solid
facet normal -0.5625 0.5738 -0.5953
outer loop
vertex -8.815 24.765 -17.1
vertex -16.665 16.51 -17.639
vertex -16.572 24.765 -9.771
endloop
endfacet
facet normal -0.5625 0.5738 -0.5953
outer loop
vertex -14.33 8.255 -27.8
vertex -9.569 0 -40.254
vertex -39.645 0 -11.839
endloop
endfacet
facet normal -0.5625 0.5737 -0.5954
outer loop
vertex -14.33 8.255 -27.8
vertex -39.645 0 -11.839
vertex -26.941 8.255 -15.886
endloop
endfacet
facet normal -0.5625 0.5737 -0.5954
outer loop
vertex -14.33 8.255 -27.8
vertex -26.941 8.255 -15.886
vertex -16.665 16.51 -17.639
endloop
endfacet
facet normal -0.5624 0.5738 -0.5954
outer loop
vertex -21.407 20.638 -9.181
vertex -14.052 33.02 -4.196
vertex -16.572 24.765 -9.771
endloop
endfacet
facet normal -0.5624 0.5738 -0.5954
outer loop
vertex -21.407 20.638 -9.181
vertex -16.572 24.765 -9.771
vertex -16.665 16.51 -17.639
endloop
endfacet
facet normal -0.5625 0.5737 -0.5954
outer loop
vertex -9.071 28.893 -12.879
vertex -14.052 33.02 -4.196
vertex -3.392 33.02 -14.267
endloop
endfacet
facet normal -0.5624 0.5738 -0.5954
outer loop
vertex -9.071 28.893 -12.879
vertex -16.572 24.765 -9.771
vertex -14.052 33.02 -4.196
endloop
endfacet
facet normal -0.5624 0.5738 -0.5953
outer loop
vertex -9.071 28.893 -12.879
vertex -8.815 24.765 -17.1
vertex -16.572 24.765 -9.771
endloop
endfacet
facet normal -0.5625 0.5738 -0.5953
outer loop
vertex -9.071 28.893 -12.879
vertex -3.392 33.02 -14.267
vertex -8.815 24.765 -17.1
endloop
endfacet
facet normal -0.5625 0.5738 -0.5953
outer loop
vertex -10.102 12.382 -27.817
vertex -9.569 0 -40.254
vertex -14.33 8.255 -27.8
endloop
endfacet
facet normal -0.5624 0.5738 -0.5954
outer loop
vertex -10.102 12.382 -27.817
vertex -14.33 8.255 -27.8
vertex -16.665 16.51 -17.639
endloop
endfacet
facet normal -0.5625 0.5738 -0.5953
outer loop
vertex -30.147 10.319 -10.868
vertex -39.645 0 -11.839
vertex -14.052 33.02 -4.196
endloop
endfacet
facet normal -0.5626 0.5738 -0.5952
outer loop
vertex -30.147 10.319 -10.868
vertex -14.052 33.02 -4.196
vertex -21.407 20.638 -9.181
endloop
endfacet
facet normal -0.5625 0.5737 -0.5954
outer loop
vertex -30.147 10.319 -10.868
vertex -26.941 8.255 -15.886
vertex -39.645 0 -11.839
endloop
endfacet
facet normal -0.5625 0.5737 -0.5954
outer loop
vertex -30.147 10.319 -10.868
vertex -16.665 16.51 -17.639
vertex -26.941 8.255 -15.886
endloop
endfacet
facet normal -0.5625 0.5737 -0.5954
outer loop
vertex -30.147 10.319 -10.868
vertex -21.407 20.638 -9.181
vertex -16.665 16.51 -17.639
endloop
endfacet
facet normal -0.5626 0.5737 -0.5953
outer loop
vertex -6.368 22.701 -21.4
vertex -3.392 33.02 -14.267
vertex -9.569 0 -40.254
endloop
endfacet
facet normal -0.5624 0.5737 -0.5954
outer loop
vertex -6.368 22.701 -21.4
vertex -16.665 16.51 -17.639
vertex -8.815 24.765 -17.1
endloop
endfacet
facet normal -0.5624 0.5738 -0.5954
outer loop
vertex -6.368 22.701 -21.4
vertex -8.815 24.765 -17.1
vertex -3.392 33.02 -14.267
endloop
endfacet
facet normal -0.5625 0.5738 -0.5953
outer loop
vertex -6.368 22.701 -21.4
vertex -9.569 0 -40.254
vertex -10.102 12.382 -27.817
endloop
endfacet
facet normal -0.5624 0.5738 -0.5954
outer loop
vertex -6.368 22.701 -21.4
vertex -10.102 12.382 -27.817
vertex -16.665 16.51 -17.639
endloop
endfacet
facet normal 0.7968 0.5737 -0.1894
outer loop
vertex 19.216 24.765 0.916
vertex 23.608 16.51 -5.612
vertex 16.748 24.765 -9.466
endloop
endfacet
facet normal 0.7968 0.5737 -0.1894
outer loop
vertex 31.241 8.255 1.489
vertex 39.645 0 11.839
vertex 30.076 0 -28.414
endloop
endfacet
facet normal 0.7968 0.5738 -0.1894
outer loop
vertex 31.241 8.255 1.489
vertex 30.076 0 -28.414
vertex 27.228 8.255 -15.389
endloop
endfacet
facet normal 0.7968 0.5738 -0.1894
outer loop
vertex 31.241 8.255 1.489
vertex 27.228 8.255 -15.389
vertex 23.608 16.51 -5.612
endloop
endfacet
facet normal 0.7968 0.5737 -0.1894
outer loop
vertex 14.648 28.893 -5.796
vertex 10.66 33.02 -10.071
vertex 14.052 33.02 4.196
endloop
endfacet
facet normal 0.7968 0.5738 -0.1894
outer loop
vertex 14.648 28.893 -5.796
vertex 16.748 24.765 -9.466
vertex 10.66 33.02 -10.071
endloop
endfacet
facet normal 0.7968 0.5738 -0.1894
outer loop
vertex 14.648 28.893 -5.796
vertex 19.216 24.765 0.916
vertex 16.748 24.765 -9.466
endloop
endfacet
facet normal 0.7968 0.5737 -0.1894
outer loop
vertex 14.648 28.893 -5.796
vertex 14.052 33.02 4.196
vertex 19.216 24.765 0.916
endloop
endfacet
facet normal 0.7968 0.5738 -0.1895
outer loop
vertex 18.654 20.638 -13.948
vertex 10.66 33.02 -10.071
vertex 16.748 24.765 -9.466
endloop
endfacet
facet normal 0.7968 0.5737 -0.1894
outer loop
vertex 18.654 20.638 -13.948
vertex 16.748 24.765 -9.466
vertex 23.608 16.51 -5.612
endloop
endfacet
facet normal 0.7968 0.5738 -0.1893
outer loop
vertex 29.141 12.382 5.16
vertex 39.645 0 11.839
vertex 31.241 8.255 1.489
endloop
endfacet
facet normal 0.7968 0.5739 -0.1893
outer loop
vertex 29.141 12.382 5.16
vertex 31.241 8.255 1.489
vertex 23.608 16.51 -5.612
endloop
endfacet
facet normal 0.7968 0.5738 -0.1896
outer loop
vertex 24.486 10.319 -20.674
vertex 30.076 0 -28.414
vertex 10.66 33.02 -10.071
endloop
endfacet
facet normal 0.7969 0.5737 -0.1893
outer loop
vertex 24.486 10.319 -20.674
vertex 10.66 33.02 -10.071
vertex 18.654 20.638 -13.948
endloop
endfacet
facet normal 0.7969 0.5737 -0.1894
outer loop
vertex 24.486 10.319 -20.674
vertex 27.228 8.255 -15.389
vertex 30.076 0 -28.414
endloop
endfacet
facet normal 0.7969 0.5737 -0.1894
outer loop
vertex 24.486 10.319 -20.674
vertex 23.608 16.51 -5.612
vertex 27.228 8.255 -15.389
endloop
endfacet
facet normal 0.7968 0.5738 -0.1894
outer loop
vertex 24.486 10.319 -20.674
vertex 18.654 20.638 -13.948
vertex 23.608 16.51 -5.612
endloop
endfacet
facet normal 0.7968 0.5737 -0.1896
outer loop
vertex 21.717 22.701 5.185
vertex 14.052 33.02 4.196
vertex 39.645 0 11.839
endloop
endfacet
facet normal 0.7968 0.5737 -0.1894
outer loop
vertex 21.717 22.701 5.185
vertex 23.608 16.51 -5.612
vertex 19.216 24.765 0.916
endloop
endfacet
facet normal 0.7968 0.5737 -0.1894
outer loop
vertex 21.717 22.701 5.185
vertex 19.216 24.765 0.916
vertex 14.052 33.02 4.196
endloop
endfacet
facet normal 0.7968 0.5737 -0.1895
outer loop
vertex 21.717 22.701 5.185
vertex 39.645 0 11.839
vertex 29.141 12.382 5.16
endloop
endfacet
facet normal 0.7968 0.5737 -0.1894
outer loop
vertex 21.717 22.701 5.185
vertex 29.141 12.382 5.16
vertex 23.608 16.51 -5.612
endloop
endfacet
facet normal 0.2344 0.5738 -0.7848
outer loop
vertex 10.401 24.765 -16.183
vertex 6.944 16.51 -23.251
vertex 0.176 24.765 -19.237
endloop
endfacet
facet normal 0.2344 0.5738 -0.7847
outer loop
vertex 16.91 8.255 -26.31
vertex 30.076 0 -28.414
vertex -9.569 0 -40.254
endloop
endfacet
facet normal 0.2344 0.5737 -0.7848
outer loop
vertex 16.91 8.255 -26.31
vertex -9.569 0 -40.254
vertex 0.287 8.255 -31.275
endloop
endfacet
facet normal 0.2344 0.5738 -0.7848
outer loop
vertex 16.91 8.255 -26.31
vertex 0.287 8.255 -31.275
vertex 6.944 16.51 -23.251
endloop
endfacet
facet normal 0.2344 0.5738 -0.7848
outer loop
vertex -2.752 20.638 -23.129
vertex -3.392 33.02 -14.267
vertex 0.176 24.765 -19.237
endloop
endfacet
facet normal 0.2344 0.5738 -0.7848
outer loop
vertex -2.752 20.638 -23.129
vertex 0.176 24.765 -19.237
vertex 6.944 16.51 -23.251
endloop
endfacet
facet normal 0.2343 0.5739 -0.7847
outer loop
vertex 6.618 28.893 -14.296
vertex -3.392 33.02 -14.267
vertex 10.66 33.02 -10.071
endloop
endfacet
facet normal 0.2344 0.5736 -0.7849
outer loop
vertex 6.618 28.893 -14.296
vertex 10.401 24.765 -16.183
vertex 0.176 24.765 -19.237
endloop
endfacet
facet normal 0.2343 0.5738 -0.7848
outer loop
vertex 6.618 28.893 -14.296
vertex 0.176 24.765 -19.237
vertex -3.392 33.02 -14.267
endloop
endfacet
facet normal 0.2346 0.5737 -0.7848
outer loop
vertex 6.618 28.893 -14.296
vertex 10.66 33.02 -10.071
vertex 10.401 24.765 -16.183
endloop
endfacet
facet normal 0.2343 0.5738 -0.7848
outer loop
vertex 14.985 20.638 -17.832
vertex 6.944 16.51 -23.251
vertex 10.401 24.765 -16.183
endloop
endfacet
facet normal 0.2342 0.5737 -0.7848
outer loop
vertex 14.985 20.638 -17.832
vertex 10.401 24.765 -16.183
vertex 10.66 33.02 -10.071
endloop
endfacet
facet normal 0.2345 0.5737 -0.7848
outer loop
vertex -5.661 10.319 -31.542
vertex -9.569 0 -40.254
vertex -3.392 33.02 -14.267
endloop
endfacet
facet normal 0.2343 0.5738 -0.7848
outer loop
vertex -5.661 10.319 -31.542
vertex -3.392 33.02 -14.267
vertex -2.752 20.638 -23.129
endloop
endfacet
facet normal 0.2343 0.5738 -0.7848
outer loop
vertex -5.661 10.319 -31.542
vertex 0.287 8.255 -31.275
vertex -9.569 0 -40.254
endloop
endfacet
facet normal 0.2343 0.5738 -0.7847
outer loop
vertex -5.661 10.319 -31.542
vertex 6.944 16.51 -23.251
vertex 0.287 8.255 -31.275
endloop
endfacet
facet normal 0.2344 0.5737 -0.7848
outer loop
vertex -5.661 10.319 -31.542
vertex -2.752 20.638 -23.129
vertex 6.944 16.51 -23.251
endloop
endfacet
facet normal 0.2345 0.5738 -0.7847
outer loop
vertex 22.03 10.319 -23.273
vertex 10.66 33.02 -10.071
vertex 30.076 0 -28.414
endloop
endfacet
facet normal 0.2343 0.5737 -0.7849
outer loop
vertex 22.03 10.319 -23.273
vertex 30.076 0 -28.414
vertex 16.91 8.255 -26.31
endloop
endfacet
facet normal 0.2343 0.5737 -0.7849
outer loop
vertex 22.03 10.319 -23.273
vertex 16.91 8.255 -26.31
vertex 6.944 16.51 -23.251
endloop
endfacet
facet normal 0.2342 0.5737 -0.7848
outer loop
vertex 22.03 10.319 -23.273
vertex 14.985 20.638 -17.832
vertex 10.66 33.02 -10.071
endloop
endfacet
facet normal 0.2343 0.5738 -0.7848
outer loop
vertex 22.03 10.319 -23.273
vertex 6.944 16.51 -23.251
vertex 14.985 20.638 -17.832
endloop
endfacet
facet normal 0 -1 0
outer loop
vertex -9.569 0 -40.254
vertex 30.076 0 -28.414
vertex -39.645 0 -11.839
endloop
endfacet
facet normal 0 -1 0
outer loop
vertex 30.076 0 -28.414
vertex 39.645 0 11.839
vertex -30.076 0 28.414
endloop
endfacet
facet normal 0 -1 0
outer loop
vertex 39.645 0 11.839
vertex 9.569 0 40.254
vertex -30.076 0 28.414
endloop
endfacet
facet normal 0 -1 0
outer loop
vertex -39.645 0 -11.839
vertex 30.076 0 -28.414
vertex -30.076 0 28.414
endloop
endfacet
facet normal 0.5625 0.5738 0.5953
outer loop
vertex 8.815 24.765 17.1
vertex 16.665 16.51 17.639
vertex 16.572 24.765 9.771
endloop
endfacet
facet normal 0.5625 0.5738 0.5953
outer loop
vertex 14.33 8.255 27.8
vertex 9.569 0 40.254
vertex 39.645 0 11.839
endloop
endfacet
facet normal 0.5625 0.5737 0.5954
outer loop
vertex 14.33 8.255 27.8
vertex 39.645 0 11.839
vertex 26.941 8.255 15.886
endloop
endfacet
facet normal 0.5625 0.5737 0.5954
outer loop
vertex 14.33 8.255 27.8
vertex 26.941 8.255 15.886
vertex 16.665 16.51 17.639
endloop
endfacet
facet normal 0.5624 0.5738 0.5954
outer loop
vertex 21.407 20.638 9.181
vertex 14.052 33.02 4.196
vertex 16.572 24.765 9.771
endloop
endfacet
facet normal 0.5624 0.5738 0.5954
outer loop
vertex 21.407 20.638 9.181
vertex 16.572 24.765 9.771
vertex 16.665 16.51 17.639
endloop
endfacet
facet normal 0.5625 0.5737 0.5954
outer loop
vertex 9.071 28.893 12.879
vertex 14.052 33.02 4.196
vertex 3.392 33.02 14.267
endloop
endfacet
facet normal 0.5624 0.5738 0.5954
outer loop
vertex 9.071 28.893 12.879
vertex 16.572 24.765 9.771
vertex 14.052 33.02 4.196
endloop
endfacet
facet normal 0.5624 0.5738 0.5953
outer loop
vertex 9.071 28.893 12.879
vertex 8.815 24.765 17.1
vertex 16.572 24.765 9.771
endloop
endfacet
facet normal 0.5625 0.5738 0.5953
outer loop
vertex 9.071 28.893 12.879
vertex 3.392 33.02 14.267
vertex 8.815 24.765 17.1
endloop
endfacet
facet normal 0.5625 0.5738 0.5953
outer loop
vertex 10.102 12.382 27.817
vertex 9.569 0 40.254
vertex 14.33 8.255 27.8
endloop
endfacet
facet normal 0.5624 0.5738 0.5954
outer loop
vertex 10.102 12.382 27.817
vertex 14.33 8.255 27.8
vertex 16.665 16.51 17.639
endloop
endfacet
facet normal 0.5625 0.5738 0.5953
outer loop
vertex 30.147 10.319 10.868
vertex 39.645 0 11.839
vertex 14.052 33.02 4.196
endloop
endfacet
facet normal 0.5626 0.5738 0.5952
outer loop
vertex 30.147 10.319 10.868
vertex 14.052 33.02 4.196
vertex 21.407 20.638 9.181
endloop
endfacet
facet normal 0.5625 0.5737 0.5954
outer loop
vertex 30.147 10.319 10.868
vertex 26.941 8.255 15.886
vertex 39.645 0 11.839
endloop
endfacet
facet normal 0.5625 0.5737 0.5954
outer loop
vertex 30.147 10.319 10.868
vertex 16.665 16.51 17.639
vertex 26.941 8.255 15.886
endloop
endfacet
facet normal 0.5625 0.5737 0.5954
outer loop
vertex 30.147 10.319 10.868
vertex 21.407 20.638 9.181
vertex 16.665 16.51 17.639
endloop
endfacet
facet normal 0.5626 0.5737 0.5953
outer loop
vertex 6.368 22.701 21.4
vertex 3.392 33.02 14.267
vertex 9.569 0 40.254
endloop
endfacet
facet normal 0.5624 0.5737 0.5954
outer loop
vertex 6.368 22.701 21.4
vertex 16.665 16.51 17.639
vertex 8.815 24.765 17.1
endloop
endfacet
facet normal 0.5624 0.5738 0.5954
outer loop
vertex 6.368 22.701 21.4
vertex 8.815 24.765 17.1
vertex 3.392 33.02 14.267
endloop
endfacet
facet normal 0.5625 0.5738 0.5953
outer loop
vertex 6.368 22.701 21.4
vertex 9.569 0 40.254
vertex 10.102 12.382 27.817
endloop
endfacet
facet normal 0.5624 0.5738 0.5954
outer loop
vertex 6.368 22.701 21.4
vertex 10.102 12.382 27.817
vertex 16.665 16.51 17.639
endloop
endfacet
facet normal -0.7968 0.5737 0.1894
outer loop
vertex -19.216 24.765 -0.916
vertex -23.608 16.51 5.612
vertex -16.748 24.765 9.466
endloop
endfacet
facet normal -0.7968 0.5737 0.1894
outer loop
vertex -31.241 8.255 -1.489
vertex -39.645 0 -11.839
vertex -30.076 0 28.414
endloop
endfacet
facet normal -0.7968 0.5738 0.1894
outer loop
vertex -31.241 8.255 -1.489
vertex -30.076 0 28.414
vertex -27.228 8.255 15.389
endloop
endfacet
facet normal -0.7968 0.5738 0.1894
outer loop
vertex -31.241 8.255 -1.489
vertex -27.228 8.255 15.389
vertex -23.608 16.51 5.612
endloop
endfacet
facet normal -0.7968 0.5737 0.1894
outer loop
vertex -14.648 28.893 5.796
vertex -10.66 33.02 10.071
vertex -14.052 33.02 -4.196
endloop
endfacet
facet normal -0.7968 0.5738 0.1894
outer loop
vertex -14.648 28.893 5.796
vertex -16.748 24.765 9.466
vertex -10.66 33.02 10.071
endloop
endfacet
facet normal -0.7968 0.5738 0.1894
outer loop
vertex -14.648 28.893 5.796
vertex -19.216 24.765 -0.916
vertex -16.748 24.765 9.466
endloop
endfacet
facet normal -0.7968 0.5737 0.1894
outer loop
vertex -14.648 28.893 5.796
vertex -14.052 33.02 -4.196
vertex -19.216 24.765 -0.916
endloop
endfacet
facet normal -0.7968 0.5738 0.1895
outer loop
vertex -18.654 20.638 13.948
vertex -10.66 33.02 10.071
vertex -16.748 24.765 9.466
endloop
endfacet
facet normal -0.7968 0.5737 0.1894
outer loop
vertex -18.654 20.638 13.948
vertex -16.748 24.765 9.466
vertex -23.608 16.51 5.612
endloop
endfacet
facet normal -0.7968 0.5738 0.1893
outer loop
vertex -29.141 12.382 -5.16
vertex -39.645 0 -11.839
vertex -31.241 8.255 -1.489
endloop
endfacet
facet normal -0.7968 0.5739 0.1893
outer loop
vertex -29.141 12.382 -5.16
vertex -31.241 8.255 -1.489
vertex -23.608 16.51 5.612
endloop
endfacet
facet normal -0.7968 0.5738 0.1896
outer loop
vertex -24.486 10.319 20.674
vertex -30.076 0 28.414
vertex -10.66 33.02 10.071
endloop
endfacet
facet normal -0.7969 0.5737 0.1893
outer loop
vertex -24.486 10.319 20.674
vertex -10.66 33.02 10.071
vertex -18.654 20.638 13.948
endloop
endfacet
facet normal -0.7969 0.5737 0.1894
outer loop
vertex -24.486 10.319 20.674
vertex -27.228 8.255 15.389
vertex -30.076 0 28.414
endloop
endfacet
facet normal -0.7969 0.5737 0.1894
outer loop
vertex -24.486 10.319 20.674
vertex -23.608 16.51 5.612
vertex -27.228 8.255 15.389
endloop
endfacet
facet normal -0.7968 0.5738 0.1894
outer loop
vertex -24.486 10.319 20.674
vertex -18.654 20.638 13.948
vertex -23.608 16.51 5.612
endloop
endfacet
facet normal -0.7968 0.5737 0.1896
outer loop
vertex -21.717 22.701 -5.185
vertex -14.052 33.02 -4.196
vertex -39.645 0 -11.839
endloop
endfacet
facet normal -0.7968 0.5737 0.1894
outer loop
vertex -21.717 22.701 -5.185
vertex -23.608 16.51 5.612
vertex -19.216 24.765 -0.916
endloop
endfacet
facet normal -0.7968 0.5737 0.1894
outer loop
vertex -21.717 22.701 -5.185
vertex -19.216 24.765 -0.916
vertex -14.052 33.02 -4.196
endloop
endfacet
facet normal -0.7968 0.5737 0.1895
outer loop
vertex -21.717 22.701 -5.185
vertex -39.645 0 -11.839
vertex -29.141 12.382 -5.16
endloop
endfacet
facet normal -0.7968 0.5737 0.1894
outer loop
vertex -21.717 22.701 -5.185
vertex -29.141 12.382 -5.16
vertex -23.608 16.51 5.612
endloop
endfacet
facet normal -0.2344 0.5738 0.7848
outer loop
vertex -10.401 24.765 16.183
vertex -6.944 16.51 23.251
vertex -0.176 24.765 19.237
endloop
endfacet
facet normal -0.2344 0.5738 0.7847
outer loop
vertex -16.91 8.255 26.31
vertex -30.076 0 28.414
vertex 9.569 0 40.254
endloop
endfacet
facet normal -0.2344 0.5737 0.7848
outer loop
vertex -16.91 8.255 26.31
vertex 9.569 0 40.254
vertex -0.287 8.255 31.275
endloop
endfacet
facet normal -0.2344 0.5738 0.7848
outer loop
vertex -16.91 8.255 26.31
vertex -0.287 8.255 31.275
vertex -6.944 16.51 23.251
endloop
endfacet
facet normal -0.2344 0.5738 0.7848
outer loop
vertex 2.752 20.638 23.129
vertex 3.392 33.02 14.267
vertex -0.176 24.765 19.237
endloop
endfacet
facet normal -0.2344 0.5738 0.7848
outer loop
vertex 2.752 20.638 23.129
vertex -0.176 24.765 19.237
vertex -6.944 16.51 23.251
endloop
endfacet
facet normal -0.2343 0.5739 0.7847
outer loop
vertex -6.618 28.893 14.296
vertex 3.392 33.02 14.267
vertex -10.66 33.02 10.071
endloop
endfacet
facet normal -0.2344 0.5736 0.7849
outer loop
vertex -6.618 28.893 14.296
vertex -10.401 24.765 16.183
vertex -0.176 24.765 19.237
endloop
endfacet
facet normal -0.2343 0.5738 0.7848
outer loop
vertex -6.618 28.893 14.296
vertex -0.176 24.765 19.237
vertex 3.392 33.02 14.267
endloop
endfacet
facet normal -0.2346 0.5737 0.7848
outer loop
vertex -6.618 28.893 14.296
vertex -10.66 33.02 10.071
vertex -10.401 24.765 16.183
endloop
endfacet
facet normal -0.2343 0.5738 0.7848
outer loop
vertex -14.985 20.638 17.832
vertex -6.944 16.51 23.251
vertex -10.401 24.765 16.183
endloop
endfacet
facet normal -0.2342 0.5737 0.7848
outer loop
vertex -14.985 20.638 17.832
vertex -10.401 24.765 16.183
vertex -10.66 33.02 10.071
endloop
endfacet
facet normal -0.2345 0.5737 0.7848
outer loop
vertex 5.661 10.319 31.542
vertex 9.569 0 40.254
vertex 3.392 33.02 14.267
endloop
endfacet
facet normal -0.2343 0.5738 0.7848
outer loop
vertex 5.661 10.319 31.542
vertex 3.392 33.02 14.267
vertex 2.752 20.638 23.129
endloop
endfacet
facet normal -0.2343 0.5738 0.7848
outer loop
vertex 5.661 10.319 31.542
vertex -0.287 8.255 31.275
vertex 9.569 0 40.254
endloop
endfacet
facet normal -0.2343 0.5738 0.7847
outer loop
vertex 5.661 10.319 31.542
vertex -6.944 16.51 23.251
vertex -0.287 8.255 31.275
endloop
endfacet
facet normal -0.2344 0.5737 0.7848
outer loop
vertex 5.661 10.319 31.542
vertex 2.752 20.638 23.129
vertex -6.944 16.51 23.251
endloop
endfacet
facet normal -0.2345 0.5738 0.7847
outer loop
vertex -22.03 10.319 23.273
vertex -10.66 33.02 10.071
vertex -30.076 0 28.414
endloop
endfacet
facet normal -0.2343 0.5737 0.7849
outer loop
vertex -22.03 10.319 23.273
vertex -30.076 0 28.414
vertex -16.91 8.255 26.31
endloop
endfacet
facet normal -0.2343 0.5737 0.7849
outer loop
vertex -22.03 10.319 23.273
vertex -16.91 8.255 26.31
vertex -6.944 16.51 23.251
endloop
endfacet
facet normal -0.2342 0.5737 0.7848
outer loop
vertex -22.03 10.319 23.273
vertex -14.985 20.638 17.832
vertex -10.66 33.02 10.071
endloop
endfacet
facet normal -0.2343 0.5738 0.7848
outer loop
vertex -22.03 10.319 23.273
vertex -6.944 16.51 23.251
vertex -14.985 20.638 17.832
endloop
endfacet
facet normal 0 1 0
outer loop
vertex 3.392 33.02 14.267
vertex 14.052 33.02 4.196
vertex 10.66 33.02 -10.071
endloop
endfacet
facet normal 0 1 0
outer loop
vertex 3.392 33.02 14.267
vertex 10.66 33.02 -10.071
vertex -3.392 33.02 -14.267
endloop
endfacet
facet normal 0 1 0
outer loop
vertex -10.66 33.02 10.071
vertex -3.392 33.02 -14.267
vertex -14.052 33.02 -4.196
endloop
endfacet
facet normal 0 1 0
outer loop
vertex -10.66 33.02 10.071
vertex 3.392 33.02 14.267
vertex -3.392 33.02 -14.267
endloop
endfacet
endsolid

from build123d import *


with BuildPart() as f3:
    # F2 (on offset) → F3 section 0
    with BuildSketch(Plane.XZ.offset(-33.02)):
        Polygon((14.0515133994, 4.1962250321), (3.3917192219, 14.2670800815), (-10.6597941775, 10.0708550494), (-14.0515133994, -4.1962250321), (-3.3917192219, -14.2670800815), (10.6597941775, -10.0708550494), align=None)
    # F0 (on Front) → F3 section 1
    with BuildSketch(Plane.XZ):
        Polygon((39.6453004225, 11.8393369674), (9.5694836335, 40.2535057903), (-30.075816789, 28.4141688228), (-39.6453004225, -11.8393369674), (-9.5694836335, -40.2535057903), (30.075816789, -28.4141688228), align=None)
    loft()


solid = f3.part
